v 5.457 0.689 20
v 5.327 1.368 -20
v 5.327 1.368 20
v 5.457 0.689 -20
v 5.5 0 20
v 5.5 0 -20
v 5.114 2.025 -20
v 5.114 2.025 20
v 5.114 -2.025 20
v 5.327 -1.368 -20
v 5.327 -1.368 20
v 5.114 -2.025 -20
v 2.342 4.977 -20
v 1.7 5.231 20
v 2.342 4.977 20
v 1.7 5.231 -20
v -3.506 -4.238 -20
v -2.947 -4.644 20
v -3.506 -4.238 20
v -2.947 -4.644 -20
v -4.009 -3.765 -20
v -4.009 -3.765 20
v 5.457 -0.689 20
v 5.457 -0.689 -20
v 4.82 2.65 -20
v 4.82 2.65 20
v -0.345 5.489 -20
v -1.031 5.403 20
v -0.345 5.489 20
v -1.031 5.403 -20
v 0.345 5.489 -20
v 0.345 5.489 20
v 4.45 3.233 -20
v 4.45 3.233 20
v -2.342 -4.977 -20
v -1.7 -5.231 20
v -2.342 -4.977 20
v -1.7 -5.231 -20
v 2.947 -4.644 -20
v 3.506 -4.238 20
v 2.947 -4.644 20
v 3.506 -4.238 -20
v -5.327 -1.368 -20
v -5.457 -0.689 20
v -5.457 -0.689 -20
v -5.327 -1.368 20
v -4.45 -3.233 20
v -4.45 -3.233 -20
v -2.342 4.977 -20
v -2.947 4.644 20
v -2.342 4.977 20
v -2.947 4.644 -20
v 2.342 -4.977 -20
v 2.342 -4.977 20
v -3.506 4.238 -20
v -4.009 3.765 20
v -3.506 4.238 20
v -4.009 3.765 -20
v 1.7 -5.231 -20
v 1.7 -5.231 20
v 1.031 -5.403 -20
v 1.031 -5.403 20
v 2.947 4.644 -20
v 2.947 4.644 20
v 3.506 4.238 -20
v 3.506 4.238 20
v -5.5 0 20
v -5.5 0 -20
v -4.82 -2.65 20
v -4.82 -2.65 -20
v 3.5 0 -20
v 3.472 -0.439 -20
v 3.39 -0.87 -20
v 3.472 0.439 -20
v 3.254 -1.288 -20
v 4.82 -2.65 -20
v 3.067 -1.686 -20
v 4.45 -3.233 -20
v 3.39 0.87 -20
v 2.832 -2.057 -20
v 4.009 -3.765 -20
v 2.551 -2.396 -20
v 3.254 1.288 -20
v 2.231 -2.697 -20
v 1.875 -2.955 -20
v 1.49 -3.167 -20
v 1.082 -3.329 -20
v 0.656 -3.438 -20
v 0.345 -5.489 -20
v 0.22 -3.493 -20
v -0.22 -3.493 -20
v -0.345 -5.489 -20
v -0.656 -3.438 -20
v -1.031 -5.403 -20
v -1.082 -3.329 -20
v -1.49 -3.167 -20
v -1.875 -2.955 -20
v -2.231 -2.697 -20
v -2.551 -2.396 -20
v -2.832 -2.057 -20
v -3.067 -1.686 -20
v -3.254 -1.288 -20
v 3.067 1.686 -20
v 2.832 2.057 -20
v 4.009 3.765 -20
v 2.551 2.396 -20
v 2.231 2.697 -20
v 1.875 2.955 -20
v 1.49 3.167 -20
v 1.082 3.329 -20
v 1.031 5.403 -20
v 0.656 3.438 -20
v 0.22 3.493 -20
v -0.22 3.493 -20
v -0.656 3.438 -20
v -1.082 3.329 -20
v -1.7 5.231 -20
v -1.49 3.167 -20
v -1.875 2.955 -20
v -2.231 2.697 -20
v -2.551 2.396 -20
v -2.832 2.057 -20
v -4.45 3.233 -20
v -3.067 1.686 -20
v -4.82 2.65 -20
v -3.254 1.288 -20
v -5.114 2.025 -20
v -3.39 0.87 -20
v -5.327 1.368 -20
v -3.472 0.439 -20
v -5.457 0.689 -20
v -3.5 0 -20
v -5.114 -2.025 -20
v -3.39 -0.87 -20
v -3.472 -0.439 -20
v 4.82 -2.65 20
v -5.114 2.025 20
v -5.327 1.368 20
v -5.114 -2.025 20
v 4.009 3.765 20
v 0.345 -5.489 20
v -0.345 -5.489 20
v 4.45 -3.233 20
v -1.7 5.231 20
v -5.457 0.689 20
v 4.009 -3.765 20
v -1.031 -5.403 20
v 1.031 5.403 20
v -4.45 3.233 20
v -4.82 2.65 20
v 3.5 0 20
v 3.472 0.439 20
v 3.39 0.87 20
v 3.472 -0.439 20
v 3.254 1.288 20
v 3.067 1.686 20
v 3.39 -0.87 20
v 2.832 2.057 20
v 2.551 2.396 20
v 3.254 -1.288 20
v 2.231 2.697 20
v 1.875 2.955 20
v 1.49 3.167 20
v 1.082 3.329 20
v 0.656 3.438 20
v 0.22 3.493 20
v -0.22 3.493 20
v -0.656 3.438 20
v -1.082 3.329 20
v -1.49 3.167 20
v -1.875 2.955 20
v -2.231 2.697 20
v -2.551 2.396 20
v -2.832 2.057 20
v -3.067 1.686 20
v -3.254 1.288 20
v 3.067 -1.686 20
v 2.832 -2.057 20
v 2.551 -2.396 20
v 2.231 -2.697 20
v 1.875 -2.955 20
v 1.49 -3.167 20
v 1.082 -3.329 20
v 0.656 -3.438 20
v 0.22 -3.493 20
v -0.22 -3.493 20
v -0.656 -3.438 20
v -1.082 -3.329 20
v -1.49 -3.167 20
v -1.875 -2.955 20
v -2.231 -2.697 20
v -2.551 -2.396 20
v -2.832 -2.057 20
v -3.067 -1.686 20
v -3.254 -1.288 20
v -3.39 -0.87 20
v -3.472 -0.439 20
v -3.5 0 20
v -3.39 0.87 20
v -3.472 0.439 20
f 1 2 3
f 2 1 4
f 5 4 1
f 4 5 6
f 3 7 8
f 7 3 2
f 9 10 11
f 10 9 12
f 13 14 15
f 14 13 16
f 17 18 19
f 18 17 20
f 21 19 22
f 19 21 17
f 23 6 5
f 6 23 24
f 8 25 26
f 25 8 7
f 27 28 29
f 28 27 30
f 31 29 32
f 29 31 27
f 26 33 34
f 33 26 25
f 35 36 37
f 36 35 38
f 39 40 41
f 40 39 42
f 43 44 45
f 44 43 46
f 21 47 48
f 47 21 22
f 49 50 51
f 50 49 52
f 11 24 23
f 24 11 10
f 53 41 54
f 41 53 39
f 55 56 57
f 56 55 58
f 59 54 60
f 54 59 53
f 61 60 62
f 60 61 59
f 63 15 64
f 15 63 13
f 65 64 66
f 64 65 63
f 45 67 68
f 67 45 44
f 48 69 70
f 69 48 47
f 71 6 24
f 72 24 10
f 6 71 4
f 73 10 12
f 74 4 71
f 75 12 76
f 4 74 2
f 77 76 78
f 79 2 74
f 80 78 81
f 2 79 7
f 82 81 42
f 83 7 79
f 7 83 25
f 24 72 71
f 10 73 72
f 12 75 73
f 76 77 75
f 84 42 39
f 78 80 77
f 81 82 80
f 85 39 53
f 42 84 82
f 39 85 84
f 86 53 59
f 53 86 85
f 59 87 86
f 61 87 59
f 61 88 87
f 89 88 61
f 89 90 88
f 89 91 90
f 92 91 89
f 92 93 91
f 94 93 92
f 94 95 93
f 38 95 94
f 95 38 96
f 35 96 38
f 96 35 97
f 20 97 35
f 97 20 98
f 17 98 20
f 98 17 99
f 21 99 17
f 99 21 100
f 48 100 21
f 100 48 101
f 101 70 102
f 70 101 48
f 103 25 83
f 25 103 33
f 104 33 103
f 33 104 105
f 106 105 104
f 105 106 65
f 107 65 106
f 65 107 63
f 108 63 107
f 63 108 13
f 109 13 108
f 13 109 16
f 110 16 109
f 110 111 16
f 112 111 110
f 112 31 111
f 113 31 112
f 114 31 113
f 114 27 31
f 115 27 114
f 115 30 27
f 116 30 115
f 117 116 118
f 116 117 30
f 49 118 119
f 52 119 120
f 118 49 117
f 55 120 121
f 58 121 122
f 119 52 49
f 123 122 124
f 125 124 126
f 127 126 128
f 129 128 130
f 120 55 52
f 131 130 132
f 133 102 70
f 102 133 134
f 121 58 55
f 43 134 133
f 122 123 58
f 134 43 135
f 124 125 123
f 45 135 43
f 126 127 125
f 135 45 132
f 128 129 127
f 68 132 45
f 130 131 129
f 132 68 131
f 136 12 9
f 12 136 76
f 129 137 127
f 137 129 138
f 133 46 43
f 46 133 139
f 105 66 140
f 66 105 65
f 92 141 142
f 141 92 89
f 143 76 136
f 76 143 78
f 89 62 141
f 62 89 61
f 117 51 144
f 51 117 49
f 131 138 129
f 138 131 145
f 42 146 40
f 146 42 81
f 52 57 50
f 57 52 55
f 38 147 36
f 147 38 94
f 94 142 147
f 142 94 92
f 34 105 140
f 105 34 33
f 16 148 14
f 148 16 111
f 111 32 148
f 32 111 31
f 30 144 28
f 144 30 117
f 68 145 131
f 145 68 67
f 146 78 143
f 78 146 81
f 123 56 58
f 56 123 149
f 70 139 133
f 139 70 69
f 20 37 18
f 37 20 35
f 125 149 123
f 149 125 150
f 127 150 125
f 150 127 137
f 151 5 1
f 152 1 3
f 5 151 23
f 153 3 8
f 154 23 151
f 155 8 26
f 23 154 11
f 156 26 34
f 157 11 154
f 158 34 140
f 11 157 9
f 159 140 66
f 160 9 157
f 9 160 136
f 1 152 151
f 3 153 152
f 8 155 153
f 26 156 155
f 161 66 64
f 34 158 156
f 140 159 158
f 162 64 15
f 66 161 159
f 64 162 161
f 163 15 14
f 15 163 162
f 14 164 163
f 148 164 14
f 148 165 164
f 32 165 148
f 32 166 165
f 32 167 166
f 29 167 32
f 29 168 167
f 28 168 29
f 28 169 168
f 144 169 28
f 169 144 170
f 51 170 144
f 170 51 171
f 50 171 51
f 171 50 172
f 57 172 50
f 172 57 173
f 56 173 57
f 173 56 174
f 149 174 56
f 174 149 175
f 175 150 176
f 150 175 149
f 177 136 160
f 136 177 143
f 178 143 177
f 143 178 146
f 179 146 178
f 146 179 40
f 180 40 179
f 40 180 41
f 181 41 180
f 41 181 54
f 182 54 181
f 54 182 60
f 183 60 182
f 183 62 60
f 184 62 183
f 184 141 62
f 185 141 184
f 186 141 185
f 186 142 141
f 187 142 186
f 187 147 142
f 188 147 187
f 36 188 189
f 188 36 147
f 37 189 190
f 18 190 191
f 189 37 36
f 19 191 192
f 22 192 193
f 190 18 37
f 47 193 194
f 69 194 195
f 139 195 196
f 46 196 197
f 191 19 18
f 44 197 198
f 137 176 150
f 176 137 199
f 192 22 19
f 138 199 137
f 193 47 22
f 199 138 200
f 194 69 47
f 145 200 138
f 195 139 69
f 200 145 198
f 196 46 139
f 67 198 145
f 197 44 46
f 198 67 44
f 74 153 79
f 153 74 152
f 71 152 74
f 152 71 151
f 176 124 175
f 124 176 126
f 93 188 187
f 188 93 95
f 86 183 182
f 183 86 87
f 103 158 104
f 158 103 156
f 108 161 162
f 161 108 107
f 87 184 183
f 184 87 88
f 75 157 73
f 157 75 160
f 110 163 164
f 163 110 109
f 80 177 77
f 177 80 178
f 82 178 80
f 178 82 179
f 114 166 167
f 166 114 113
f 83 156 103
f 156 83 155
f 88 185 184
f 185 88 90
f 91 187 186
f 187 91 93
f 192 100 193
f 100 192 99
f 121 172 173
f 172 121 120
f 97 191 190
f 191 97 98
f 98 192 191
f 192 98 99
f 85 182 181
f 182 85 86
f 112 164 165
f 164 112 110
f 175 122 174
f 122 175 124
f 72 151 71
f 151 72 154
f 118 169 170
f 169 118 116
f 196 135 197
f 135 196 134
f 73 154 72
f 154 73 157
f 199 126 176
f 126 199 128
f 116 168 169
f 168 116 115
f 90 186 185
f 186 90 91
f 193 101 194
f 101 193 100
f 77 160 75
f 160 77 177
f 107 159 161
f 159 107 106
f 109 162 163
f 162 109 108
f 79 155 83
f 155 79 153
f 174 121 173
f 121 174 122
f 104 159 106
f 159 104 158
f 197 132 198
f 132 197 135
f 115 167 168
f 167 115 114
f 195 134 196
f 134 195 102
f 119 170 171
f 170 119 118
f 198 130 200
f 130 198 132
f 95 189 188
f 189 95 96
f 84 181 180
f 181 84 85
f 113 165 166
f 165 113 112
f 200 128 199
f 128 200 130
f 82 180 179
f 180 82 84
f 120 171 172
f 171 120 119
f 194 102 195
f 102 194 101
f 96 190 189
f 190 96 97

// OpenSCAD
$fn = 50;


difference() {
	union() {
		translate(v = [0, 0, -20.0000000000]) {
			cylinder(h = 40, r = 5.5000000000);
		}
	}
	union() {
		translate(v = [0, 0, -100.0000000000]) {
			cylinder(h = 200, r = 3.5000000000);
		}
	}
}
